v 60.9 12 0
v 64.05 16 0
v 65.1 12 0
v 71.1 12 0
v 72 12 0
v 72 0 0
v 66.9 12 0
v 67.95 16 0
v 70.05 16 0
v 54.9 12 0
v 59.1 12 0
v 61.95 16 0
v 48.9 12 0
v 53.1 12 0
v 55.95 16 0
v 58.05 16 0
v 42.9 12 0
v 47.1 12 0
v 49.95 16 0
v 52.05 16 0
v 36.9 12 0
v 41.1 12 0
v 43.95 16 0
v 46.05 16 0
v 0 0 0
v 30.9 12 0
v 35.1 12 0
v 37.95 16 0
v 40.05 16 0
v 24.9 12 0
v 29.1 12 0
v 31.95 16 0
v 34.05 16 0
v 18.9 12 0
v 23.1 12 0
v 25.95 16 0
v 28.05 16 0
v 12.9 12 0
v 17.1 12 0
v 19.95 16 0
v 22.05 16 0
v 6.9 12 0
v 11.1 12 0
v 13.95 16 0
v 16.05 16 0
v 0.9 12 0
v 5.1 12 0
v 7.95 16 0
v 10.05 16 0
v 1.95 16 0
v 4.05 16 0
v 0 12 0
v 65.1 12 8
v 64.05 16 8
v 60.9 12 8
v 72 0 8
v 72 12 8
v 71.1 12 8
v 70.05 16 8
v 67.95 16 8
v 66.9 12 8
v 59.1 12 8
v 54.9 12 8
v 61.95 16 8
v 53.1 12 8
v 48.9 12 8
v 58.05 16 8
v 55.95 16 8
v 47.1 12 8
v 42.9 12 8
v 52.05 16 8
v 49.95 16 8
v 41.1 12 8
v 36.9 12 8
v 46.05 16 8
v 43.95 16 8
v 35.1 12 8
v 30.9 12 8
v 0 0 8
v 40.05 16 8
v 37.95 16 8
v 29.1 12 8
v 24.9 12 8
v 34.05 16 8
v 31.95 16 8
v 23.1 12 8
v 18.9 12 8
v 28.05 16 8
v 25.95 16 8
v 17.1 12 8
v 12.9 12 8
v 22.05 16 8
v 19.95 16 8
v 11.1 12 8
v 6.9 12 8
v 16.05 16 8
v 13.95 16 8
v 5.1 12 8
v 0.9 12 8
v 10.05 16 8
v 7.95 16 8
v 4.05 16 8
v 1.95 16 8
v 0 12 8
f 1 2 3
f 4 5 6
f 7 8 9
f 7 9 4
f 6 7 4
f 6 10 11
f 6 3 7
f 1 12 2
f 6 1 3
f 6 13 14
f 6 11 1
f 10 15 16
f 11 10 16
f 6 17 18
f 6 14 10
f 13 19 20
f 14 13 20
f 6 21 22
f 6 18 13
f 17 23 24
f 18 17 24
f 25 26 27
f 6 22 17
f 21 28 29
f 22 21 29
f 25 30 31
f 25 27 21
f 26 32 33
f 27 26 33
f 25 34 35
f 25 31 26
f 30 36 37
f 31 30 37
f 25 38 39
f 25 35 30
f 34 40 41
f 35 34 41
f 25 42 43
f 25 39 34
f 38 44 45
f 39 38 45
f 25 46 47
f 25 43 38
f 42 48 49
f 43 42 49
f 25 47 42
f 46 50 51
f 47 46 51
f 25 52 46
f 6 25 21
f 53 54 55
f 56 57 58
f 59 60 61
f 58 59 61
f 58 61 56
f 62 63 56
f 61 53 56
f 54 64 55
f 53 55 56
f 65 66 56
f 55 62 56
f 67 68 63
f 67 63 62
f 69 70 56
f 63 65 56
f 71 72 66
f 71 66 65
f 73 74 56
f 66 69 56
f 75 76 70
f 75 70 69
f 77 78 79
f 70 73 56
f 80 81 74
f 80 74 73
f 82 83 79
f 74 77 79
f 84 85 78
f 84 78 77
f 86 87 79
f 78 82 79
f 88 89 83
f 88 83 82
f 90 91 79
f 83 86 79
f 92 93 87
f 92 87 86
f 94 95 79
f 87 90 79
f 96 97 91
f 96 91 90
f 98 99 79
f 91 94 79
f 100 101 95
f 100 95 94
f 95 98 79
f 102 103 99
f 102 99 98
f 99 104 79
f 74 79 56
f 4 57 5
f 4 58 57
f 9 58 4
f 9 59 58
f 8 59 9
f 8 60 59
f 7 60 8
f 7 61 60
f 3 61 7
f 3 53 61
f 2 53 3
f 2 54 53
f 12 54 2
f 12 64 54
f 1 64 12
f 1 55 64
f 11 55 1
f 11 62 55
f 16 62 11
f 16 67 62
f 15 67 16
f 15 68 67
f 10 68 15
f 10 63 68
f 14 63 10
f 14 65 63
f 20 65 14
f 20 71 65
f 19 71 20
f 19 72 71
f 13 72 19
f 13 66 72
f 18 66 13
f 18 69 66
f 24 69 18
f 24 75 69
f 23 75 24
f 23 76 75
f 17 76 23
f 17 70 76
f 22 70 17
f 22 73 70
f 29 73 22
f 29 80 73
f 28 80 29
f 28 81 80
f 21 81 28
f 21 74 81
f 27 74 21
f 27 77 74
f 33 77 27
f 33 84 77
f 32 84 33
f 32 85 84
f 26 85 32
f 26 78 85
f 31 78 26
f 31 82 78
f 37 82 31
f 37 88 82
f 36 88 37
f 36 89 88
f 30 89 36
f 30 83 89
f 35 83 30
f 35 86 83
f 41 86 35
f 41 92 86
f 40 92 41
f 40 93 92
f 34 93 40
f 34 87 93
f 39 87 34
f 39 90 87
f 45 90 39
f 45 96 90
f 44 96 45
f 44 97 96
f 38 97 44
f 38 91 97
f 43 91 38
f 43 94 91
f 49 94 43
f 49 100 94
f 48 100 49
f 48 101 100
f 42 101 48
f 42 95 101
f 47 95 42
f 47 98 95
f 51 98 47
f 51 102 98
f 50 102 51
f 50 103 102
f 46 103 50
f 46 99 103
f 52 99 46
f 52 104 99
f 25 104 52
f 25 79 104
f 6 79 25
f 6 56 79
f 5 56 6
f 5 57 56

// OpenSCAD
$fn = 32;

// ----------------------------------------------------------------------
// Gear rack: 12 teeth, pitch 6 mm
// ----------------------------------------------------------------------

// --- parameters (mm) ---
teeth = 12;               // number of teeth
pitch = 6;                // tooth pitch, X
root_w = 4.2;             // tooth width at the root
tip_w = 2.1;              // tooth width at the tip
base_h = 12;              // rack body height, Y
tooth_h = 4;              // tooth height above the body
plate_t = 8;              // rack width, Z (extrusion height)

rack_l = teeth * pitch;  // overall length
total_h = base_h + tooth_h;  // overall height

profile = [[0, 0], [72, 0], [72, 12], [71.1, 12], [70.05, 16], [67.95, 16], [66.9, 12], [65.1, 12], [64.05, 16], [61.95, 16], [60.9, 12], [59.1, 12], [58.05, 16], [55.95, 16], [54.9, 12], [53.1, 12], [52.05, 16], [49.95, 16], [48.9, 12], [47.1, 12], [46.05, 16], [43.95, 16], [42.9, 12], [41.1, 12], [40.05, 16], [37.95, 16], [36.9, 12], [35.1, 12], [34.05, 16], [31.95, 16], [30.9, 12], [29.1, 12], [28.05, 16], [25.95, 16], [24.9, 12], [23.1, 12], [22.05, 16], [19.95, 16], [18.9, 12], [17.1, 12], [16.05, 16], [13.95, 16], [12.9, 12], [11.1, 12], [10.05, 16], [7.95, 16], [6.9, 12], [5.1, 12], [4.05, 16], [1.95, 16], [0.9, 12], [0, 12]];  // primary outline, 52 points, counter clockwise

// --- the one profile operation ---
linear_extrude(height = plate_t) polygon(points = profile);
